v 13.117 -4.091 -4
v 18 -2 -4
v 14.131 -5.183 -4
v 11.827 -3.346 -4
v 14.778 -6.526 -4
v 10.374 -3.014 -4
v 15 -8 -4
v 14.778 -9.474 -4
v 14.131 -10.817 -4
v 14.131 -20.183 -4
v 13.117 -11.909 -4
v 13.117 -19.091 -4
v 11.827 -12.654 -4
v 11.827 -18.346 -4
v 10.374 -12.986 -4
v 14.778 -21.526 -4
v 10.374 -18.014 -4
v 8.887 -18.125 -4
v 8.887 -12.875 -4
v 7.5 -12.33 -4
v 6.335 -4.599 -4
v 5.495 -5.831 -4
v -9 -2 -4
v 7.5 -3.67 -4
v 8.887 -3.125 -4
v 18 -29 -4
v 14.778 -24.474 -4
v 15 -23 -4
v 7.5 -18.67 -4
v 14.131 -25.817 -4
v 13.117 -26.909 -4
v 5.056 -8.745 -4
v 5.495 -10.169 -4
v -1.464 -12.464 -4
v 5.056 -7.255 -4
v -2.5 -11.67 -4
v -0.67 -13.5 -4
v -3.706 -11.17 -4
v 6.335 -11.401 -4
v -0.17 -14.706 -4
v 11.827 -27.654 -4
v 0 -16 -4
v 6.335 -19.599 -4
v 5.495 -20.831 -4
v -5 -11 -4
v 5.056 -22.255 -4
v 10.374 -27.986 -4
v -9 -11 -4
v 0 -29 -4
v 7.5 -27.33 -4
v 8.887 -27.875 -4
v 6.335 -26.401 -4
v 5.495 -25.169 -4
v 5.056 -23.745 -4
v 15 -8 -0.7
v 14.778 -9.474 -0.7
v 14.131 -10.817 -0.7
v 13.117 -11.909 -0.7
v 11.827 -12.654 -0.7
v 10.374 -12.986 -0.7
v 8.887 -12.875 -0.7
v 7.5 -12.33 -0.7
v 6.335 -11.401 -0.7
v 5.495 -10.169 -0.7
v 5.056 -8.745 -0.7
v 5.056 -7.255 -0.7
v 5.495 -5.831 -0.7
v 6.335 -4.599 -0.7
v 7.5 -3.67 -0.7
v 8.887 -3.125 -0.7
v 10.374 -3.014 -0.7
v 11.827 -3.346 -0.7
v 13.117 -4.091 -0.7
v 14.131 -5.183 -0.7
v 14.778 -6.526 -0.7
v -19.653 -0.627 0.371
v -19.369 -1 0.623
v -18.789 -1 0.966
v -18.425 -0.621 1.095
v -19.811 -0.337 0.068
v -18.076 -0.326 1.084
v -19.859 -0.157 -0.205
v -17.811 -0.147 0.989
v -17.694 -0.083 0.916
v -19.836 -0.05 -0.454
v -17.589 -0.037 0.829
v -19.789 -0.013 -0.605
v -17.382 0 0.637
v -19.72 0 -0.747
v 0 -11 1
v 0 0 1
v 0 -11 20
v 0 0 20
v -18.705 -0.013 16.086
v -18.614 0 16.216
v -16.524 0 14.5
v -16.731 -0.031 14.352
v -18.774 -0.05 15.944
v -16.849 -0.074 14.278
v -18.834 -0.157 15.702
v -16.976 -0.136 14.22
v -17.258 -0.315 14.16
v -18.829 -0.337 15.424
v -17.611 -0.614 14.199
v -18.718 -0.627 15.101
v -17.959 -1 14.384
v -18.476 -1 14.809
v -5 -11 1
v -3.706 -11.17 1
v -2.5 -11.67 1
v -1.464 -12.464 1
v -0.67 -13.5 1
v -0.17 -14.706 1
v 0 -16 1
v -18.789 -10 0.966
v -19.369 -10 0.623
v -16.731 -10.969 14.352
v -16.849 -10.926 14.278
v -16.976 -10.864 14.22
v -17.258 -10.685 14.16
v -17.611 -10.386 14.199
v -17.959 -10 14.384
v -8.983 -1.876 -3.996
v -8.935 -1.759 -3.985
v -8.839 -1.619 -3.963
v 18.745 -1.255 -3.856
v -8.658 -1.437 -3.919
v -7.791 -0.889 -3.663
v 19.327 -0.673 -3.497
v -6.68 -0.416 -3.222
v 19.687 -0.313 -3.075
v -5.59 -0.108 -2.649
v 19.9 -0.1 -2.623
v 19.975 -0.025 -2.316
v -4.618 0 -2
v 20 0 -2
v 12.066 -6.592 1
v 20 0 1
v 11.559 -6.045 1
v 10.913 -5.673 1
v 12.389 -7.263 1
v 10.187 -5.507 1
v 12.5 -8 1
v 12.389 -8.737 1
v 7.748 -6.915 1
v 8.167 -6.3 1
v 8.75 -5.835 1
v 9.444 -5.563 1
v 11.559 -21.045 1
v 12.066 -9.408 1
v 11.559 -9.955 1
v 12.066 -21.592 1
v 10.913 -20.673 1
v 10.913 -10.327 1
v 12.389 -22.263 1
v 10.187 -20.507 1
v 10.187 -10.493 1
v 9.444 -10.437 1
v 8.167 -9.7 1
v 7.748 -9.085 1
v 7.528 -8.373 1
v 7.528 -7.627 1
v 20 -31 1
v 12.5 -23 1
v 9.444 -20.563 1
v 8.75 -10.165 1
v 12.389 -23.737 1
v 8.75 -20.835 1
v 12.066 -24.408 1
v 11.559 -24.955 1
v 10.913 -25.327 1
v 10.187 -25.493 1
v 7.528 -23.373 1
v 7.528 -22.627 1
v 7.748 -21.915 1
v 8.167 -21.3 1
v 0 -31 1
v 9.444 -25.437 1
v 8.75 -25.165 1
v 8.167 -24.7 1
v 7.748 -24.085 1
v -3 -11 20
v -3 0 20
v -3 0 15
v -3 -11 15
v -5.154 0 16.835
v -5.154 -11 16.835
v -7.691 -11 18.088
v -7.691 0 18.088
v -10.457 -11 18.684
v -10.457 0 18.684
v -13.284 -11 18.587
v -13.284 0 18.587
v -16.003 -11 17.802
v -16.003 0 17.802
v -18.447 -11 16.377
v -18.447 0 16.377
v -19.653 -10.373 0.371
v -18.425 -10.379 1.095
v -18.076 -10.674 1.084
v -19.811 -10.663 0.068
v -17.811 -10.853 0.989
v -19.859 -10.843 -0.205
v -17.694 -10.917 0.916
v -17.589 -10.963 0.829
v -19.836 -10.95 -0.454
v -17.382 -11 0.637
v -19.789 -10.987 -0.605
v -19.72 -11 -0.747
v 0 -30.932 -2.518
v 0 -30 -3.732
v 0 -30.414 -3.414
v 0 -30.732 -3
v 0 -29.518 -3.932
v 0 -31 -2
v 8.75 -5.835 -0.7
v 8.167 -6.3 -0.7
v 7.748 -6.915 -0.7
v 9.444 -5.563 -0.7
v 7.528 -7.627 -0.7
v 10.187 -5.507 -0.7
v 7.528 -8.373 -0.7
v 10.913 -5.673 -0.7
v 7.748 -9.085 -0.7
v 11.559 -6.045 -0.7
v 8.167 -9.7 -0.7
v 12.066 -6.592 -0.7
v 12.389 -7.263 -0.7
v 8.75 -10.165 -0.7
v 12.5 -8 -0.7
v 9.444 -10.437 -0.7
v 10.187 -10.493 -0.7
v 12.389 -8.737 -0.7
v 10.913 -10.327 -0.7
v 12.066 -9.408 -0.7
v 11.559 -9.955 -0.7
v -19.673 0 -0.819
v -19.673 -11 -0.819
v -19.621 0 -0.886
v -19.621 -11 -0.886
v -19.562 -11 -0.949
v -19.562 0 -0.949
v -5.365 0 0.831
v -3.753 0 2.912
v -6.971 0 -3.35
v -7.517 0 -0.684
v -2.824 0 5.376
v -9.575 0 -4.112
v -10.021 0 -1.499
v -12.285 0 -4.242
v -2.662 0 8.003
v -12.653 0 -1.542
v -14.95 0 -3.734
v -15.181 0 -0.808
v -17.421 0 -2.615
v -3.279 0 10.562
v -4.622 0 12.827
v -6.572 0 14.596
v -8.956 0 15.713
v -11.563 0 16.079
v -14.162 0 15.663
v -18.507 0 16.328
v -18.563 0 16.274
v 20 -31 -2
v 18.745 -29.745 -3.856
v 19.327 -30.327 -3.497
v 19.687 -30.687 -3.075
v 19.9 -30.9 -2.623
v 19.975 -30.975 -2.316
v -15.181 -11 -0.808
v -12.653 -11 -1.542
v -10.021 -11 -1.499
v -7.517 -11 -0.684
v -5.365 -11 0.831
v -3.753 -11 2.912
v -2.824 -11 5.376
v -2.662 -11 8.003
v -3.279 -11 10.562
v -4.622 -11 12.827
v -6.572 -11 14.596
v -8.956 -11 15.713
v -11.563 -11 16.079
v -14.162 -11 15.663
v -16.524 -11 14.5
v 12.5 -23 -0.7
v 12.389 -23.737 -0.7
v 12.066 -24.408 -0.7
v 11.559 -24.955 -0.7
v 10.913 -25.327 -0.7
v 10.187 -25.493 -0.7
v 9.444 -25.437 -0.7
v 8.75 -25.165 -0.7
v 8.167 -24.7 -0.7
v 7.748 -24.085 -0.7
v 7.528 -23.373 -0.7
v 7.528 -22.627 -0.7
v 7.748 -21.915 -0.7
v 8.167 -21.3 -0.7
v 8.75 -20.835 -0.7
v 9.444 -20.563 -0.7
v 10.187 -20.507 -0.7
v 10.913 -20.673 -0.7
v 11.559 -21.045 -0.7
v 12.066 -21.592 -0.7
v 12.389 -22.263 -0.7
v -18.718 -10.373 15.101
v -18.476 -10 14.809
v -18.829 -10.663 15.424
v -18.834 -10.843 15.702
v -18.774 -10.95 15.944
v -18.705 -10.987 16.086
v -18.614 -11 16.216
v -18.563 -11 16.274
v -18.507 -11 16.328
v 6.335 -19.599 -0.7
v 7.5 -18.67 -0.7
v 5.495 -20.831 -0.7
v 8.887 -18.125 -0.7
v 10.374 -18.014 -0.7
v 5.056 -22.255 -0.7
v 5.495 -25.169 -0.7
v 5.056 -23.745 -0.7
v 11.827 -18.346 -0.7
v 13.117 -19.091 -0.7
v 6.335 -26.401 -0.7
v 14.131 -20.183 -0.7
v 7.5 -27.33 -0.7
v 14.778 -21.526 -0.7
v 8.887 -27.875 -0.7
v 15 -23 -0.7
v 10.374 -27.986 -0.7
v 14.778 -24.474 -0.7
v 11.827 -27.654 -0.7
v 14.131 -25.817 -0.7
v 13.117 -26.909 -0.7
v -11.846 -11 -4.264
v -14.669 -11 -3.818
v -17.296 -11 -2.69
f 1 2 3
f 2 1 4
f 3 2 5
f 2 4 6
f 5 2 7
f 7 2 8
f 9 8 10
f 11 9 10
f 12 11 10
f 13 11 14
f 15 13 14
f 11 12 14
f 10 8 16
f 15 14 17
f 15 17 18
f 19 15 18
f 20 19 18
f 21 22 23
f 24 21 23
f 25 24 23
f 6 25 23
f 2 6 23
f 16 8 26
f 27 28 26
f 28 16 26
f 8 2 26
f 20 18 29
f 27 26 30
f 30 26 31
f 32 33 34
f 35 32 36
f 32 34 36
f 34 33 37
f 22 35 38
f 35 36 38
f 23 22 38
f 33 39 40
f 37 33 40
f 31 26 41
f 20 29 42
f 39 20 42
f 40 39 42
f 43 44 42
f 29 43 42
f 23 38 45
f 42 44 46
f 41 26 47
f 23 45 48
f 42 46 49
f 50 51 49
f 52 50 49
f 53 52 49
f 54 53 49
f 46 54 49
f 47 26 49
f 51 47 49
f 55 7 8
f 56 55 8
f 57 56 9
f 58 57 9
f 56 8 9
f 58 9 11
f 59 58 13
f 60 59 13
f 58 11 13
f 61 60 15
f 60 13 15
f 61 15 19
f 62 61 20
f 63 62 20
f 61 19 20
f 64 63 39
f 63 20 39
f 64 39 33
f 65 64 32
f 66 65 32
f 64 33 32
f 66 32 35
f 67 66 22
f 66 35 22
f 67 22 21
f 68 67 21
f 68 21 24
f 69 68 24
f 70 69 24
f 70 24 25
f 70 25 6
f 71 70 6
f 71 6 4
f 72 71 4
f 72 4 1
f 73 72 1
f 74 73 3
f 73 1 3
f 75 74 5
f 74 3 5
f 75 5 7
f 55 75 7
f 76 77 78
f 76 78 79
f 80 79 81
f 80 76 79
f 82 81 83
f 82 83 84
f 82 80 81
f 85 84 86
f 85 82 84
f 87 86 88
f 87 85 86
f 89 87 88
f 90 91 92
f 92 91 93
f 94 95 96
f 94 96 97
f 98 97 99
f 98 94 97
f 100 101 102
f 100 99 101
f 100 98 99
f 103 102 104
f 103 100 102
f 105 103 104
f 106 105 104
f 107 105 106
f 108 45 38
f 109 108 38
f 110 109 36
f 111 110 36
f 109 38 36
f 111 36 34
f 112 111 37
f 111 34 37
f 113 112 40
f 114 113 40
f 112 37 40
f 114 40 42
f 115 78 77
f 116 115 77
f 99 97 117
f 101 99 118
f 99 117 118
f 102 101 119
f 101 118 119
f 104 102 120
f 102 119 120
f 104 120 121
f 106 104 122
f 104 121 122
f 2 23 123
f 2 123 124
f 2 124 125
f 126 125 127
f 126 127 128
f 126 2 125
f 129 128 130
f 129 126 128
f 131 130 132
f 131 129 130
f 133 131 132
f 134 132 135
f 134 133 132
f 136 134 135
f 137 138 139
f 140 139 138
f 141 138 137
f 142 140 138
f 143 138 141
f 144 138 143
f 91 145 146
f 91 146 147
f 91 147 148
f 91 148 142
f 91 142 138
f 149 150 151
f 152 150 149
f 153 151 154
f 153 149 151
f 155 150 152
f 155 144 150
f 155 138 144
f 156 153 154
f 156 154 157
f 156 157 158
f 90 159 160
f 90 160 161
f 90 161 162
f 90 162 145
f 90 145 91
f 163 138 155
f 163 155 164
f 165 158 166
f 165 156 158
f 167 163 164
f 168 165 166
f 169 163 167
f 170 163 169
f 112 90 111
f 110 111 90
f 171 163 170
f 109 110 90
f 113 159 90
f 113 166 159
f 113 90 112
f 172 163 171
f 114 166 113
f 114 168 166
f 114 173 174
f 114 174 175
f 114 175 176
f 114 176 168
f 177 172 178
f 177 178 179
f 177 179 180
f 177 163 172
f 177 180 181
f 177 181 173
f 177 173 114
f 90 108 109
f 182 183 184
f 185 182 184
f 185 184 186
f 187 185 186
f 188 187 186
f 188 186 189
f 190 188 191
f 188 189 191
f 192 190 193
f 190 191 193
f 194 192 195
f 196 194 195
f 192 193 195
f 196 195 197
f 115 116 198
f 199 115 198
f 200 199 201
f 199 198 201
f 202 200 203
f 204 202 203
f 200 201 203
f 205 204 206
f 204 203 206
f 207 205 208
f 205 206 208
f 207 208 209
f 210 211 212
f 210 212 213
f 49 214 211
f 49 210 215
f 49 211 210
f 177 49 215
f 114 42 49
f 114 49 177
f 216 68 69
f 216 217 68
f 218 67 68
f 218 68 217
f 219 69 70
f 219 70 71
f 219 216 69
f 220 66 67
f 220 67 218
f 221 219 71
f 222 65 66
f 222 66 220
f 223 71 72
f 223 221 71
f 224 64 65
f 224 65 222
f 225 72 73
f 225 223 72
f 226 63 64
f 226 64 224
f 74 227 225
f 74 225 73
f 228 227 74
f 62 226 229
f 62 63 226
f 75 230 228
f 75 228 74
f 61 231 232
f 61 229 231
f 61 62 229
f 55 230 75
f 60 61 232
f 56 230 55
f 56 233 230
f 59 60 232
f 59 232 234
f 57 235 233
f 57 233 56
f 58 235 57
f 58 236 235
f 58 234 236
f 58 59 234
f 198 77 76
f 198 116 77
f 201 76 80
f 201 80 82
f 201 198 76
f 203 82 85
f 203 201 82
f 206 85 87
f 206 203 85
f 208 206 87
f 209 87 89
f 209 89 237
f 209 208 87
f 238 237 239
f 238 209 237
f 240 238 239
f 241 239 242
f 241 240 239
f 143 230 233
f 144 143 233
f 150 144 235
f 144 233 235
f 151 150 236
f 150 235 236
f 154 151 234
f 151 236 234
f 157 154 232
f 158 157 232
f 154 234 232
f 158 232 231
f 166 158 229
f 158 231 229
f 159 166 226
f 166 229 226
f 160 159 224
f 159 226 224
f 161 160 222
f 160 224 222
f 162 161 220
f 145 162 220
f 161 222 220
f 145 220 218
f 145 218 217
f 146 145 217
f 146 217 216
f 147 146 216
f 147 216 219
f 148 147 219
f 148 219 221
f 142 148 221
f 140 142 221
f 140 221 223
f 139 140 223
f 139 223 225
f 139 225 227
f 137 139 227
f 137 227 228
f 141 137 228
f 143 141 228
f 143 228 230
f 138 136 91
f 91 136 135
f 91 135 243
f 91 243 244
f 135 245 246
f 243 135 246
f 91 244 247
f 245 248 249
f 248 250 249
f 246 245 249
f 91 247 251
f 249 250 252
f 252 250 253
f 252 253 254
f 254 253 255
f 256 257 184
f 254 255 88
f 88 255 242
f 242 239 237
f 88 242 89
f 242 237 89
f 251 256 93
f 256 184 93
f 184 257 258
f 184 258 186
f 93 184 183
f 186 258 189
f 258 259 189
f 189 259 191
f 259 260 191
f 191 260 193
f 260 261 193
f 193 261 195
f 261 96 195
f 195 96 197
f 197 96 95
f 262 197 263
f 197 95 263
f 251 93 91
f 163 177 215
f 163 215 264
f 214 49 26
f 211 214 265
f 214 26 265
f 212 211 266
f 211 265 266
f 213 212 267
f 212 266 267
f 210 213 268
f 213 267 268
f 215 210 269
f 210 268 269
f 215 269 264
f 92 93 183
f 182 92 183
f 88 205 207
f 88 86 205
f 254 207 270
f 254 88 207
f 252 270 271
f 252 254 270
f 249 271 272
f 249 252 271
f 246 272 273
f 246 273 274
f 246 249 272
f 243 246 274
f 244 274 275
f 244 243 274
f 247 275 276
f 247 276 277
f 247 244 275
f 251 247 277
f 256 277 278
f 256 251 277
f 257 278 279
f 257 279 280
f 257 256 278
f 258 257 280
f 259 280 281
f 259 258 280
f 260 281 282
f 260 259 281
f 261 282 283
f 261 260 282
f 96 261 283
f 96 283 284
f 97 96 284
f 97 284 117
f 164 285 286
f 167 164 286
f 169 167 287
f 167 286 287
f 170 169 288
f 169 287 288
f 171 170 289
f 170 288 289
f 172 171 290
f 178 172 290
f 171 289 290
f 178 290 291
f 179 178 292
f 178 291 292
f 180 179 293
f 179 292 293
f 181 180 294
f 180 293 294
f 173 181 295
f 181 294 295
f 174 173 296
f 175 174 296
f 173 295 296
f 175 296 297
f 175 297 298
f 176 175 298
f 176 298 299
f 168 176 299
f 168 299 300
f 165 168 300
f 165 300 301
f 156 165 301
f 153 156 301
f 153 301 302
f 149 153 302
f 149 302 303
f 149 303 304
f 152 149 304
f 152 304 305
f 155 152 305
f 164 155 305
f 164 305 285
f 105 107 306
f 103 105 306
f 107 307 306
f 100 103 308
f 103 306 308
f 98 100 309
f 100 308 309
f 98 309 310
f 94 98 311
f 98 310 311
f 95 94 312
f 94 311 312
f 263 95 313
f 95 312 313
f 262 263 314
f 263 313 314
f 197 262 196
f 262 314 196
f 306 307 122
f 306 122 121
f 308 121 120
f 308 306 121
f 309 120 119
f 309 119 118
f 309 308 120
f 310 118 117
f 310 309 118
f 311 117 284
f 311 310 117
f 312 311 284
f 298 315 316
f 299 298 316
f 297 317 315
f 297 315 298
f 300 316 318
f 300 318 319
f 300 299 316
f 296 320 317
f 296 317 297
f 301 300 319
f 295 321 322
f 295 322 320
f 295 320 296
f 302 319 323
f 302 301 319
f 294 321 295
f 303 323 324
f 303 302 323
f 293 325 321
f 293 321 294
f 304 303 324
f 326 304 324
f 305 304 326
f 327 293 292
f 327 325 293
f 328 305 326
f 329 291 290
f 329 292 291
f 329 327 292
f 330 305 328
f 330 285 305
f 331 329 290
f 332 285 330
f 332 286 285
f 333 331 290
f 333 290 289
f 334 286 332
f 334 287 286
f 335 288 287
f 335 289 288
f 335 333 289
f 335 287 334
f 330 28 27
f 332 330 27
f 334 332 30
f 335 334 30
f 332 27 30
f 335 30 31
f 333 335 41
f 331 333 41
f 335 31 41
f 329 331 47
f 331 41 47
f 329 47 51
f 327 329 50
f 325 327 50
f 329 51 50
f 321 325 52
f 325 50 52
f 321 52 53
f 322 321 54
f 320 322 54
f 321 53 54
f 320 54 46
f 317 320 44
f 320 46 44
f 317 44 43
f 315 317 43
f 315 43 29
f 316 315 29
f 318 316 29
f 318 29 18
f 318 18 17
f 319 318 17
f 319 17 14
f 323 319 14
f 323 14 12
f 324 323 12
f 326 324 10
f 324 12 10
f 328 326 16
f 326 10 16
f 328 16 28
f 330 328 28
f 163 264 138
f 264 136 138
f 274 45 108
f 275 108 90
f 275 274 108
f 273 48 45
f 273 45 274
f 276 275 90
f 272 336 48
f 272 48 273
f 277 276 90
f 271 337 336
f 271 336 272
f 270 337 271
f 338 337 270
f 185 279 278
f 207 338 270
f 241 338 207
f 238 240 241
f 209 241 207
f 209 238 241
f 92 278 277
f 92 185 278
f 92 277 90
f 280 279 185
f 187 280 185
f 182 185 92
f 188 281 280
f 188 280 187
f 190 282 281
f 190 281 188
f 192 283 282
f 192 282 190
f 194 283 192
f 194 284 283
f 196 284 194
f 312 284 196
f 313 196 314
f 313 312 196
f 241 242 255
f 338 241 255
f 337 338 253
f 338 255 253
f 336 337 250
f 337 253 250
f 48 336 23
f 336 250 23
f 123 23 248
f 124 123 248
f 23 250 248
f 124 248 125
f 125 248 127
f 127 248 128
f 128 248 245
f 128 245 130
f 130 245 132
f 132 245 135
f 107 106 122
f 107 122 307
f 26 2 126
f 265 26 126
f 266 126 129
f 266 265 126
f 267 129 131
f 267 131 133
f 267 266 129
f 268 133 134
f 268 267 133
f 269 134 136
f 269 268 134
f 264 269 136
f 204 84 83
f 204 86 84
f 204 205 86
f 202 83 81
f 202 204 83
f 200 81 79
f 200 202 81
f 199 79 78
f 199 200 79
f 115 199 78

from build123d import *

# Parameters (mm, degrees)
PAD_DEPTH       = 11
FILLET_R        = 1
FILLET001_R     = 1
SKETCH001_W     = 5
SKETCH001_H     = 11
PAD001_DEPTH    = 20
SKETCH002_W     = 20
SKETCH002_H     = 5
PAD002_DEPTH    = 20
SKETCH003_R     = 5
POCKET_DEPTH    = 3.3
PAD003_DEPTH    = 5
SKETCH005_R     = 2.5
POCKET001_DEPTH = 5
FILLET002_R     = 2


with BuildPart() as part:
    # Sketch → Pad (new body)
    with BuildSketch(Plane.XZ):
        with BuildLine():
            Line((0, 0), (0, 20))
            Line((0, 20), (-3, 20))
            Line((-3, 20), (-3, 15))
            ThreePointArc((-3, 15), (-11.080706, 18.723006), (-19.399163, 15.566764))
            Line((-17.330276, 13.868571), (-19.399163, 15.566764))
            ThreePointArc((-18.108729, 1.368571), (-2.645027, 6.679789), (-17.330276, 13.868571))
            Line((-18.108729, 1.368571), (-20.421014, 0))
            ThreePointArc((-20.421014, 0), (-15.279185, -3.623719), (-9, -4))
            Line((-9, -4), (0, -4))
            Line((0, 0), (0, -4))
        make_face()
    extrude(amount=PAD_DEPTH)

    # Fillet
    fillet_edges = [part.edges().sort_by_distance(p)[0] for p in [
        (-18.108729, -5.5, 1.368571),
        (-20.421014, -5.5, 0),
        (-19.264872, 0, 0.684285),
        (-19.264872, -11, 0.684285),
    ]]
    fillet(fillet_edges, radius=FILLET_R)

    # Fillet001
    fillet001_edges = [part.edges().sort_by_distance(p)[0] for p in [
        (-17.330276, -5.5, 13.868571),
        (-19.399163, -5.5, 15.566764),
        (-18.364719, 0, 14.717668),
        (-18.364719, -11, 14.717668),
    ]]
    fillet(fillet001_edges, radius=FILLET001_R)

    # Sketch001 (on Face17 of Fillet001) → Pad001 (join)
    with BuildSketch(Plane(origin=(0, 0, 0), x_dir=(0, 0, 1), z_dir=(1, 0, 0))):
        with Locations((-1.5, 5.5)):
            Rectangle(SKETCH001_W, SKETCH001_H)
    extrude(amount=PAD001_DEPTH)

    # Sketch002 (on Face21 of Pad001) → Pad002 (join)
    with BuildSketch(Plane.XZ.offset(11)):
        with Locations((10, -1.5)):
            Rectangle(SKETCH002_W, SKETCH002_H)
    extrude(amount=PAD002_DEPTH)

    # Sketch003 (on Face26 of Pad002) → Pocket (cut)
    with BuildSketch(Plane(origin=(0, 0, -4), x_dir=(1, 0, 0), z_dir=(0, 0, -1))):
        with Locations((10, 23)):
            Circle(SKETCH003_R)
        with Locations((10, 8)):
            Circle(SKETCH003_R)
    extrude(amount=-POCKET_DEPTH, mode=Mode.SUBTRACT)

    # Sketch004 (on Face15 of Pocket) → Pad003 (join)
    with BuildSketch(Plane(origin=(0, 0, -4), x_dir=(1, 0, 0), z_dir=(0, 0, -1))):
        with BuildLine():
            ThreePointArc((-5, 11), (-1.464466, 12.464466), (0, 16))
            Line((0, 16), (0, 11))
            Line((0, 11), (-5, 11))
        make_face()
    extrude(amount=-PAD003_DEPTH)

    # Sketch005 (on Face35 of Pad003) → Pocket001 (cut)
    with BuildSketch(Plane(origin=(0, 0, -0.7), x_dir=(1, 0, 0), z_dir=(0, 0, -1))):
        with Locations((10, 23)):
            Circle(SKETCH005_R)
        with Locations((10, 8)):
            Circle(SKETCH005_R)
    extrude(amount=-POCKET001_DEPTH, mode=Mode.SUBTRACT)

    # Fillet002
    fillet002_edges = [part.edges().sort_by_distance(p)[0] for p in [
        (10, -31, -4),
        (20, -21, -4),
        (10, 0, -4),
        (20, -5.5, -4),
    ]]
    fillet(fillet002_edges, radius=FILLET002_R)


solid = part.part
